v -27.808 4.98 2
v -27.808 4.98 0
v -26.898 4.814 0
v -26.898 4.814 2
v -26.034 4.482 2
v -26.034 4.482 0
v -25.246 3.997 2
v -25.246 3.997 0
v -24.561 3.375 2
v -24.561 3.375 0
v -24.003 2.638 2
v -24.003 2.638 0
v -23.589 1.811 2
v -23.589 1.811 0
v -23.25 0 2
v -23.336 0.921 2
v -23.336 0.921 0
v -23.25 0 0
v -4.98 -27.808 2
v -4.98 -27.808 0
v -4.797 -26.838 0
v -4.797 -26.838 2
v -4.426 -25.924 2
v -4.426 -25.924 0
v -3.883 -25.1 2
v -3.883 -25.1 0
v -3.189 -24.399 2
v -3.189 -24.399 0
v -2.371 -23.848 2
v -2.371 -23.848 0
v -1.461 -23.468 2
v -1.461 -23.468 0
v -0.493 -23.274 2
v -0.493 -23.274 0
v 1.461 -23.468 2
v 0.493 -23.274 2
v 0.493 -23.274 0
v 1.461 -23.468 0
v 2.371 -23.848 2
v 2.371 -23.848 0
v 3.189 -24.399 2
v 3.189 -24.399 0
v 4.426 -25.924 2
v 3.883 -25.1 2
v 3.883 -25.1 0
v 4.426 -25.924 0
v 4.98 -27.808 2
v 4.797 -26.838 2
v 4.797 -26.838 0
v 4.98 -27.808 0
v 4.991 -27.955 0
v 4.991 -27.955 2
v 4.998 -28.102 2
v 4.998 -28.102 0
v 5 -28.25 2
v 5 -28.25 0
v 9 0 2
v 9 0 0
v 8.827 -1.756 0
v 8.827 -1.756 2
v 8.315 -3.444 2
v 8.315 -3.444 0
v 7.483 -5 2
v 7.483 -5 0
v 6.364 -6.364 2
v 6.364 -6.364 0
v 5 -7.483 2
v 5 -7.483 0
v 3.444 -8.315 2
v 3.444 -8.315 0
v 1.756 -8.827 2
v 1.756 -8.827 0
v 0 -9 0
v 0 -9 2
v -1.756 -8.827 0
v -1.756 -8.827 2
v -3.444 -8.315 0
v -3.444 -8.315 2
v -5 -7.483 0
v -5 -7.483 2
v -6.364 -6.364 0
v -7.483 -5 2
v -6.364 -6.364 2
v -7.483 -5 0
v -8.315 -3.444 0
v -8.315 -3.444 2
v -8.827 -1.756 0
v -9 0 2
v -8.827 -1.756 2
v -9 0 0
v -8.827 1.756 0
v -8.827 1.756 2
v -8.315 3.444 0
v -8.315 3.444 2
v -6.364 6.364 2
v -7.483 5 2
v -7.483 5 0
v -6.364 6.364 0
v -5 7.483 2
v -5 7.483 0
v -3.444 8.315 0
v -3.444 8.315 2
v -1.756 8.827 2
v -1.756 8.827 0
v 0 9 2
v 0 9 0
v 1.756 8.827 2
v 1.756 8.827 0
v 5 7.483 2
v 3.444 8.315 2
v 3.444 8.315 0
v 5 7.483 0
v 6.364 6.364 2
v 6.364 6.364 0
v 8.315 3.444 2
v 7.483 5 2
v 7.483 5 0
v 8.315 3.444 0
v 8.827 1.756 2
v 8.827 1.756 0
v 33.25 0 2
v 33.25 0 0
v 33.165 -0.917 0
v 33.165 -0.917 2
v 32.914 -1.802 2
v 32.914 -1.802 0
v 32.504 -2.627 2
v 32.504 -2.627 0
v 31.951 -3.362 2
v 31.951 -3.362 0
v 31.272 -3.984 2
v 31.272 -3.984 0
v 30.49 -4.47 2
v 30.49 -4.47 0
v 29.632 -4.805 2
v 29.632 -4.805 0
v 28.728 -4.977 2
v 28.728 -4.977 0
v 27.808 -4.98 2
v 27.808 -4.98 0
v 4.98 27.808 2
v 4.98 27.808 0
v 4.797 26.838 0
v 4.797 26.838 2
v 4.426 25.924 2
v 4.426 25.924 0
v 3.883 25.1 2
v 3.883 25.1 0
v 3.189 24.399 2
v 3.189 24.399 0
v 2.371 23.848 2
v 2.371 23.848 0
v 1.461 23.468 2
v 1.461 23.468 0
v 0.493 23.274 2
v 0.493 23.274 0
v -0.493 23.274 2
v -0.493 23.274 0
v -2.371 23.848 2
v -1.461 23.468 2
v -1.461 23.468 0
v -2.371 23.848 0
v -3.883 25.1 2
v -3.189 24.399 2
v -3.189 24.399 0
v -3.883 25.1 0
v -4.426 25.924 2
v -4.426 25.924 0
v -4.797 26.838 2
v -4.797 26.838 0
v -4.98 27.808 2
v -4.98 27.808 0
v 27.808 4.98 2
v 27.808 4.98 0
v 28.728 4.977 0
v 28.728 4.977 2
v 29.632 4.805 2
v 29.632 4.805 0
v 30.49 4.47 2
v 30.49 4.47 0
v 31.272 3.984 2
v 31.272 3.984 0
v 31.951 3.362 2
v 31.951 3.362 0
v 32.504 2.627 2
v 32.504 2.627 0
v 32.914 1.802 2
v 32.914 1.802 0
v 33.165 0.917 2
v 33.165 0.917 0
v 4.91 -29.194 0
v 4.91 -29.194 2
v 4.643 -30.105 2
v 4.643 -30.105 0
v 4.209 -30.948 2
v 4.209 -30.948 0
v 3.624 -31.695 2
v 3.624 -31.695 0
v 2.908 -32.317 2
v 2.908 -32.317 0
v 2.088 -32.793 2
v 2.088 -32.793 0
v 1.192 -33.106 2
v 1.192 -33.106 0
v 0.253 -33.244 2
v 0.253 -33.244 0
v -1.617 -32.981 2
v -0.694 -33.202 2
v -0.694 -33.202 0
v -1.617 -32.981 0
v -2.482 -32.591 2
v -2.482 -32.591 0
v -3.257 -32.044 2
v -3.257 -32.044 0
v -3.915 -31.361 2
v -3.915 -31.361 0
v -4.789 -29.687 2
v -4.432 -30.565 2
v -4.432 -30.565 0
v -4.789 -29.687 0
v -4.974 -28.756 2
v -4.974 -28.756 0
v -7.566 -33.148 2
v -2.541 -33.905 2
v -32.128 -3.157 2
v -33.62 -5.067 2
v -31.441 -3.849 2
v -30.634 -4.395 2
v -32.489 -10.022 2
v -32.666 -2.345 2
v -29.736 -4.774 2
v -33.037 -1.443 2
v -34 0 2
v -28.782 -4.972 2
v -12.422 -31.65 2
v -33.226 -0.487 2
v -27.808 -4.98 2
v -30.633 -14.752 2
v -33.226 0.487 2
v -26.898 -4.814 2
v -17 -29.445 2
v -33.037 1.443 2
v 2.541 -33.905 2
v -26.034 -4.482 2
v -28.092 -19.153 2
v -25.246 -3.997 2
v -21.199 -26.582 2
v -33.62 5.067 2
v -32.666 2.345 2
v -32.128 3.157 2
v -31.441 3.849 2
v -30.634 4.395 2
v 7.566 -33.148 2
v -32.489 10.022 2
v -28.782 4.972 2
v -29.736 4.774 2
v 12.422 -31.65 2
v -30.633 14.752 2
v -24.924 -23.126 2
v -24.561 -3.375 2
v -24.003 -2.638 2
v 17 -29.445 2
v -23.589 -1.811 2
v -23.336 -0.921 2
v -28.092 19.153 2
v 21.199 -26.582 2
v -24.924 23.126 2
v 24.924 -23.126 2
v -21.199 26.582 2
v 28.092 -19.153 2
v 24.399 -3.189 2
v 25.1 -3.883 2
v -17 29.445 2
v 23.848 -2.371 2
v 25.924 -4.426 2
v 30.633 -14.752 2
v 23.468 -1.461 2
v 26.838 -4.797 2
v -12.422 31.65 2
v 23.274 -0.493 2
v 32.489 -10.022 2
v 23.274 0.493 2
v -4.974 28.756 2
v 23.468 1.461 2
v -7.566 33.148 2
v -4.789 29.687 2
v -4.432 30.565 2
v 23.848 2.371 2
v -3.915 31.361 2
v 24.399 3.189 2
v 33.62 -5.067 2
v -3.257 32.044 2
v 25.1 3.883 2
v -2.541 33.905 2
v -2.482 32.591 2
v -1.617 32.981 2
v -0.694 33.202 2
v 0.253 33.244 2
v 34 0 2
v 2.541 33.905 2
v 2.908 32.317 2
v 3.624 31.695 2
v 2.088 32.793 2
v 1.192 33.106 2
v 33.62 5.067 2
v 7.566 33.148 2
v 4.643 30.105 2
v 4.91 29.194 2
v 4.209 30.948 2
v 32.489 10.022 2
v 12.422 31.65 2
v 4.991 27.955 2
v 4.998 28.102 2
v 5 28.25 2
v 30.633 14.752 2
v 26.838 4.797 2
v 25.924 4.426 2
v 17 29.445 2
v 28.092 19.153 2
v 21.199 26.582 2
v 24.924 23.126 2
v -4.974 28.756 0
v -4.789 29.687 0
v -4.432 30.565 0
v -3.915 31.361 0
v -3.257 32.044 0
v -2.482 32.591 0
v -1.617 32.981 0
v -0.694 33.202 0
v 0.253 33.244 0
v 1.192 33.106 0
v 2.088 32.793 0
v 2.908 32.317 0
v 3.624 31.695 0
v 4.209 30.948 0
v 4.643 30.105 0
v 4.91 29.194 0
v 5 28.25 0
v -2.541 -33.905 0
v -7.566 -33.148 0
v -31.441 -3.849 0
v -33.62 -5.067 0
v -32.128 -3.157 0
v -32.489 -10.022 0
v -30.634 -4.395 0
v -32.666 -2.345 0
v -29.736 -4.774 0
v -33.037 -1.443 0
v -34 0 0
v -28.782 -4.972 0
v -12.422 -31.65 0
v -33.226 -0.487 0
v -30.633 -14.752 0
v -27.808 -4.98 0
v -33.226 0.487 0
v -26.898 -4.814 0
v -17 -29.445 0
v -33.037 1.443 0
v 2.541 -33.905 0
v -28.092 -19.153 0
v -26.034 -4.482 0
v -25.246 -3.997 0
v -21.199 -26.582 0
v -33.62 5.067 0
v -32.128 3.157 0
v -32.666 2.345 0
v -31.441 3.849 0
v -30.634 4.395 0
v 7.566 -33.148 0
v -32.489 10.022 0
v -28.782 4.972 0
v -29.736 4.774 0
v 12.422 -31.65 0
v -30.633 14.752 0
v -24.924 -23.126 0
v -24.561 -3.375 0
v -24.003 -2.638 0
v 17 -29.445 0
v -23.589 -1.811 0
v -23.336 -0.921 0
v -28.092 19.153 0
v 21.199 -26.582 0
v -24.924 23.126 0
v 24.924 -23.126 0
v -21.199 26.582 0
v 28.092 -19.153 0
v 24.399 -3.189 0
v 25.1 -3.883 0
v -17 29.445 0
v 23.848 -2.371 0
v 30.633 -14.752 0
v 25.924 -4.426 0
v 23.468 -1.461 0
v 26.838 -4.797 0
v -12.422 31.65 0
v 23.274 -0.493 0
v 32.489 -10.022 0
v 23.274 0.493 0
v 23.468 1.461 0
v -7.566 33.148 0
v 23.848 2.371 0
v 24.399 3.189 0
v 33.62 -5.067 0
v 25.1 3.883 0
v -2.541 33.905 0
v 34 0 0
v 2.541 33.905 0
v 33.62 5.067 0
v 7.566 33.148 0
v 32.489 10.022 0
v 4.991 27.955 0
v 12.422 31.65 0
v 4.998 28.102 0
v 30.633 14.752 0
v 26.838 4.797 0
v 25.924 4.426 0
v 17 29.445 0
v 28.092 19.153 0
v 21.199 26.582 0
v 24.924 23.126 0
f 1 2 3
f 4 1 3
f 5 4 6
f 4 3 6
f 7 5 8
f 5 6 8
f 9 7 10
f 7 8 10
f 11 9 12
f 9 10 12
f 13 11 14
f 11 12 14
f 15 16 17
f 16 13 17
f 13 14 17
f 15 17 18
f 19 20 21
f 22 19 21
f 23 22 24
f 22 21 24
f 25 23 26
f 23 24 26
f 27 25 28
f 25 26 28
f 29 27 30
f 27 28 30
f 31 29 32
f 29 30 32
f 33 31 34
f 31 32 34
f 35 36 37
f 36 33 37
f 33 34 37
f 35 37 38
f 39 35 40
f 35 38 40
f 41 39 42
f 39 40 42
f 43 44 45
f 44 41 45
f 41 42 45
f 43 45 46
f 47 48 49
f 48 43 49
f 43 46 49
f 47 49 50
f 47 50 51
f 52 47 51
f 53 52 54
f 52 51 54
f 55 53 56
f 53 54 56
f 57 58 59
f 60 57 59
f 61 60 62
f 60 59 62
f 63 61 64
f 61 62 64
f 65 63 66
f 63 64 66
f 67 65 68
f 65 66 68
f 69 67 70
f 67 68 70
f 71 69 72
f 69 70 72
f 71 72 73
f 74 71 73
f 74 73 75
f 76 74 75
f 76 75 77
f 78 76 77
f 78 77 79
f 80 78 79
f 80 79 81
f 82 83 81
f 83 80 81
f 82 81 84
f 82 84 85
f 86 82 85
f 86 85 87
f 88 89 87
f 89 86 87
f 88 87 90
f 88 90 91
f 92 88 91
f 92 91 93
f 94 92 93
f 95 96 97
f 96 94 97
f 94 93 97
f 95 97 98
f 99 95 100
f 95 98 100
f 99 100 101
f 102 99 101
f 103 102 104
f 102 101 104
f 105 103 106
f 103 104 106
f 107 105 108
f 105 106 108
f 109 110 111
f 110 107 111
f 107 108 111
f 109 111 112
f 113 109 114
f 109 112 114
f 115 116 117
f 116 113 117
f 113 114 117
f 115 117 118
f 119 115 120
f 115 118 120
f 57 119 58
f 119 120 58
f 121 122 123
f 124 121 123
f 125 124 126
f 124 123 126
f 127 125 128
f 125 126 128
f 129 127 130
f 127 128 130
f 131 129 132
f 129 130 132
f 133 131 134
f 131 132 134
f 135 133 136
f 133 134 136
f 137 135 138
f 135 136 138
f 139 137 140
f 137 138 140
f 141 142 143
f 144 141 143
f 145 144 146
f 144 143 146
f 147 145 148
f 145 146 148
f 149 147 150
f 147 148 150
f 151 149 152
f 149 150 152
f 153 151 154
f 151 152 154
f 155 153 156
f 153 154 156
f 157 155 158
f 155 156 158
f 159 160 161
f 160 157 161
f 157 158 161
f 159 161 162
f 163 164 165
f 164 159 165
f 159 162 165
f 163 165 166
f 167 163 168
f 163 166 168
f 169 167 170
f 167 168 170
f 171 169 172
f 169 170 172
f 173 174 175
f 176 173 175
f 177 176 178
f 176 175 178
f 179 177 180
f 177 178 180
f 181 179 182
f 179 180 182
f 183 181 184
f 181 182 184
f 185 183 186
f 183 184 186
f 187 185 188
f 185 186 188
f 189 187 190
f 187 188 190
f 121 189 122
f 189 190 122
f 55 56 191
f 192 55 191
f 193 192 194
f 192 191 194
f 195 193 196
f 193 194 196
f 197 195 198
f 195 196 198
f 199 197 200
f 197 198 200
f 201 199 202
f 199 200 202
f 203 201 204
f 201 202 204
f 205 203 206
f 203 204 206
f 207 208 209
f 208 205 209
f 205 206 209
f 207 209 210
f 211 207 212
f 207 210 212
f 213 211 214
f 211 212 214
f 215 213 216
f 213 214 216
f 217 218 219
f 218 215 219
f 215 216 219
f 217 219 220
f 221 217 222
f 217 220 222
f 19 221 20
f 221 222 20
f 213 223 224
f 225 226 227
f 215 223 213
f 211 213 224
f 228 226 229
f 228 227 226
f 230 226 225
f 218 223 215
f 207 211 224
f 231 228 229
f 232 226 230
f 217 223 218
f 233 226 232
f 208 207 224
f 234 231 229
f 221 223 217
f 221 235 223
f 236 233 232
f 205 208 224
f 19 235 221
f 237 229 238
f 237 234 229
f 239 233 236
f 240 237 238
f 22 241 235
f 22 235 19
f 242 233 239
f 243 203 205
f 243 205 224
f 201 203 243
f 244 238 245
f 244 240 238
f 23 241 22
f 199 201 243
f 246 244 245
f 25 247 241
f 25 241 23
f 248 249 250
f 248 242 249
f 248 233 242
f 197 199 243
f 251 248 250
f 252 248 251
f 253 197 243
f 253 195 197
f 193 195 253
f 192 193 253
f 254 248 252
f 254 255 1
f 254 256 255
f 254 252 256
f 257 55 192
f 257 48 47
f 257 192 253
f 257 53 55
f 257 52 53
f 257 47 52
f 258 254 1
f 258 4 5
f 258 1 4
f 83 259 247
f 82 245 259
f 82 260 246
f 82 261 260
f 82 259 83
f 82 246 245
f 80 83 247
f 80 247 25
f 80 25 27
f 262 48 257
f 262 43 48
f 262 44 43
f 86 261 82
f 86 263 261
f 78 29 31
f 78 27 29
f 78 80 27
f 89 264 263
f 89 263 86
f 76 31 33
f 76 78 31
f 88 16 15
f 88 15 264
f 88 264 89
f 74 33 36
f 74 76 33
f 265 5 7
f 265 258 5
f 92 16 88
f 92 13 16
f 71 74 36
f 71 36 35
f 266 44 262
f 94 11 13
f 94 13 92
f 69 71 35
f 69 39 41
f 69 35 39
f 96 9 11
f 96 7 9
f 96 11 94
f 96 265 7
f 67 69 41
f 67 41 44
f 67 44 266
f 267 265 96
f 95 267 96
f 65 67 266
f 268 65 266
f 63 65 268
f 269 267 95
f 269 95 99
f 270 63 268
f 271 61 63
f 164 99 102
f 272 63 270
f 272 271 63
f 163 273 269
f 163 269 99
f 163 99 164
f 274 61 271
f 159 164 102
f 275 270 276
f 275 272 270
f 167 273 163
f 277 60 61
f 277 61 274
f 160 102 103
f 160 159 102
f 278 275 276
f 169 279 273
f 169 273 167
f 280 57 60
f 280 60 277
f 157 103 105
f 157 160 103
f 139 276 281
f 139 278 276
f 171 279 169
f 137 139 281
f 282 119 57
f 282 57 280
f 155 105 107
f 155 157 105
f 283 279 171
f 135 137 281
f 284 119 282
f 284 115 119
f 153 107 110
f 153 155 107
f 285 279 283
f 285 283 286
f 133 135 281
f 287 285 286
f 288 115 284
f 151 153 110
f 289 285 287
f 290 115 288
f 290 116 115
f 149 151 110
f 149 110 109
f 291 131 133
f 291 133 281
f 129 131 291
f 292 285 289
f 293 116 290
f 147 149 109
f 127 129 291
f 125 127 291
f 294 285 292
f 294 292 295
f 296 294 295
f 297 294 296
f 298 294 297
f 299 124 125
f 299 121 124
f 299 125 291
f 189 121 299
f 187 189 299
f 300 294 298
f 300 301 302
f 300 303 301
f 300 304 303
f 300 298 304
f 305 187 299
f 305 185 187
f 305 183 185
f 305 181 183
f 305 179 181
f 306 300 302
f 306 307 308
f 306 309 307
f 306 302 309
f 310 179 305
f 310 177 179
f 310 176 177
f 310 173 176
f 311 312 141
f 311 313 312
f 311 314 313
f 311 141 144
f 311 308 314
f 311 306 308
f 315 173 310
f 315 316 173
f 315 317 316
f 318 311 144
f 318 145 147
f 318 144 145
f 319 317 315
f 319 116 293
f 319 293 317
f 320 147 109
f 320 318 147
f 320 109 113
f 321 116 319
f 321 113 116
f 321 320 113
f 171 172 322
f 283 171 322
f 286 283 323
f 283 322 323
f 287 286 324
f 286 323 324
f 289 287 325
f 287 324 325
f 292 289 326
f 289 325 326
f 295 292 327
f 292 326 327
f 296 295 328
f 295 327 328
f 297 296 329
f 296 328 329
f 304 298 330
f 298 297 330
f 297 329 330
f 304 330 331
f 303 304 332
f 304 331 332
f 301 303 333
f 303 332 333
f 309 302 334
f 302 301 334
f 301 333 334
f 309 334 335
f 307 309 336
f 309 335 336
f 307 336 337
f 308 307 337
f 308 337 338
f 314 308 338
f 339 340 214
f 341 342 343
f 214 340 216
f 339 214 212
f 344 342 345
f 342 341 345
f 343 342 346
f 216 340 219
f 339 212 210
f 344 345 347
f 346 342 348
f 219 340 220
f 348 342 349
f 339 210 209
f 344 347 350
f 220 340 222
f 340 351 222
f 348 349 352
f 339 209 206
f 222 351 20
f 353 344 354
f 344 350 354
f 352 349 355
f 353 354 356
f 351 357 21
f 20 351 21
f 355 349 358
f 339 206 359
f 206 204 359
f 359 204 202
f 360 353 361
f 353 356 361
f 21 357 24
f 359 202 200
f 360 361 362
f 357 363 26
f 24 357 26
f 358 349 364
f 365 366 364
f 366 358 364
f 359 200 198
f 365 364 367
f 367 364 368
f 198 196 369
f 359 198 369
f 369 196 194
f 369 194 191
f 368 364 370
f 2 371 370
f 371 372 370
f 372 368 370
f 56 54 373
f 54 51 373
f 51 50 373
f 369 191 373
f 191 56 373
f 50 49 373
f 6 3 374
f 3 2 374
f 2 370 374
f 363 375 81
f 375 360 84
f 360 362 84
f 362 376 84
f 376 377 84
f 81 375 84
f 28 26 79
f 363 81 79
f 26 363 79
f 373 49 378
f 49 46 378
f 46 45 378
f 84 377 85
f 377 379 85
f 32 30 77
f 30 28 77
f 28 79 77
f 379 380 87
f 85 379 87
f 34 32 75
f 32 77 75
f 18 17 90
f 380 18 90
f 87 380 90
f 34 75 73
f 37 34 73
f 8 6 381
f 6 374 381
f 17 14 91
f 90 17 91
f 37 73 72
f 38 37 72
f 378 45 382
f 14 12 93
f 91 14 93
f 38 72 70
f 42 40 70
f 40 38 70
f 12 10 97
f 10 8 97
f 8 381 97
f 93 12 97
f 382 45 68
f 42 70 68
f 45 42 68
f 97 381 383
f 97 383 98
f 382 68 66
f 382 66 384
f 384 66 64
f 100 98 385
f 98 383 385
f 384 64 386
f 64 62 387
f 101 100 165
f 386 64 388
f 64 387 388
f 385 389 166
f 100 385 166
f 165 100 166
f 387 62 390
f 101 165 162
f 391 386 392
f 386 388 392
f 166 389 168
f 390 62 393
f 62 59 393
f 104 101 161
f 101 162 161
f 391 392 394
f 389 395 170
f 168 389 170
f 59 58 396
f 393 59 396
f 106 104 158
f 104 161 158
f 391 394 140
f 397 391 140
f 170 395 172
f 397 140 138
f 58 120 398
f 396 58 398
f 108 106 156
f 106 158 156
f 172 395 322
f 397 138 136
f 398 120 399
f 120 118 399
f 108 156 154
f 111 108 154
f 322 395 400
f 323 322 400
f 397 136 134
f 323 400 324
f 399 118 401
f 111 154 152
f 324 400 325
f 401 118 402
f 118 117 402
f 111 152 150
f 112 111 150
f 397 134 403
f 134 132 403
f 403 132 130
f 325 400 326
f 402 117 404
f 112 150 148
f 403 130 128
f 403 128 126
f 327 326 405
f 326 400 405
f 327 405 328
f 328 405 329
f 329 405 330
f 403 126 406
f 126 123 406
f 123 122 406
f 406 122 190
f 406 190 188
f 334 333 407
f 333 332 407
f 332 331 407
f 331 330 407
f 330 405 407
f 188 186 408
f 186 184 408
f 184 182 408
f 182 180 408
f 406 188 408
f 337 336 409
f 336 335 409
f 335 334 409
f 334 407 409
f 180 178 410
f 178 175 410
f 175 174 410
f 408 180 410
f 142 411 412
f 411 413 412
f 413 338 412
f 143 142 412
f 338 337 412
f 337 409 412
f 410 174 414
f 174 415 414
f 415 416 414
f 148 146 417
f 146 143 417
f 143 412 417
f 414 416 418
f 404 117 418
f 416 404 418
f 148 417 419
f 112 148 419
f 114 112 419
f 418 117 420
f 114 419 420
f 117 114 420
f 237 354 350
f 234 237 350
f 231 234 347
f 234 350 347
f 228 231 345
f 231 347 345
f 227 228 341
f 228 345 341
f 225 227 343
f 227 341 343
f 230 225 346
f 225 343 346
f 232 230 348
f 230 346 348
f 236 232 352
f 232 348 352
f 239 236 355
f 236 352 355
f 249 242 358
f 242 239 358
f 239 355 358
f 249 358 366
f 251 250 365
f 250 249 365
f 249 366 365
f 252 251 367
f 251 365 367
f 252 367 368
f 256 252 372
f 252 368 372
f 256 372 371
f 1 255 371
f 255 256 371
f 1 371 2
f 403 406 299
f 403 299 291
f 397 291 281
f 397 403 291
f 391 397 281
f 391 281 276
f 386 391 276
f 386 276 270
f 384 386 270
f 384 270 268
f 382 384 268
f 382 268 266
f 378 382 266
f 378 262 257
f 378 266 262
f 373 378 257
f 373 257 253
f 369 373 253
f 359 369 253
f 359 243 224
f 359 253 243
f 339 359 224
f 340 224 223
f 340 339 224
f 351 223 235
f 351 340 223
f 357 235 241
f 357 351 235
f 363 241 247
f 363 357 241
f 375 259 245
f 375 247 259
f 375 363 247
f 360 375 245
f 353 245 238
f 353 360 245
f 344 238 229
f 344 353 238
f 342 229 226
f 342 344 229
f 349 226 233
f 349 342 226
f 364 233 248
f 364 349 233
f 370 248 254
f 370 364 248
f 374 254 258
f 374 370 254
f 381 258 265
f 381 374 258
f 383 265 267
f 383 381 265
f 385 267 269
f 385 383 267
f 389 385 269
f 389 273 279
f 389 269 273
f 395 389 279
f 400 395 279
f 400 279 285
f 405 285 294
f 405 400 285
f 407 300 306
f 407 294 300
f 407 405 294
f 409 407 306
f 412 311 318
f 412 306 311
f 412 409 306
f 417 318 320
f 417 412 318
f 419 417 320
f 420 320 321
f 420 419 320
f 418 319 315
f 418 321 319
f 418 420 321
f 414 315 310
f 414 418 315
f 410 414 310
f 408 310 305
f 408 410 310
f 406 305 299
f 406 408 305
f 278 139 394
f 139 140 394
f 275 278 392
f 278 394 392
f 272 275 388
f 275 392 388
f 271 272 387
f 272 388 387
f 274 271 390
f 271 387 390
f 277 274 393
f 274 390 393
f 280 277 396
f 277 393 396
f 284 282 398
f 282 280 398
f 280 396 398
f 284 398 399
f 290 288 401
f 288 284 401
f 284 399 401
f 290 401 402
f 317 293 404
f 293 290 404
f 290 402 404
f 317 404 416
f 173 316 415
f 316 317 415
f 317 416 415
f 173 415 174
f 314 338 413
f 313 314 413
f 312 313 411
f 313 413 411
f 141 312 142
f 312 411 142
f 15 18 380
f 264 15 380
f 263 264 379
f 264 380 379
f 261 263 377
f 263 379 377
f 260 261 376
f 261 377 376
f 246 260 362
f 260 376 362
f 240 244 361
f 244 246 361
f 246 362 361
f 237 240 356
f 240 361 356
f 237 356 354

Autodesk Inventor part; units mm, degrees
ref_plane "YZ Plane" through (0, 0, 0) normal (1, 0, 0) x (0, 1, 0)
ref_plane "XZ Plane" through (0, 0, 0) normal (0, 1, 0) x (-1, 0, 0)
ref_plane "XY Plane" through (0, 0, 0) normal (0, 0, 1) x (1, 0, 0)
sketch "Sketch1" plane through (0, 0, 0) normal (0, 0, 1) x (1, 0, 0)
  circle A0 centre (0, 0) radius 34
  circle A1 centre (0, 0) radius 9
  circle A2 centre (0, 28.25) radius 5
  circle A3 centre (-28.25, 0) radius 5
  circle A4 centre (0, -28.25) radius 5
  circle A5 centre (28.25, 0) radius 5
  arc A6 (4.9804, 27.8075) -> (-4.9804, 27.8075) centre (0, 0) ccw
  arc A7 (27.8075, -4.9804) -> (27.8075, 4.9804) centre (0, 0) ccw
  arc A8 (-27.8075, 4.9804) -> (-27.8075, -4.9804) centre (0, 0) ccw
  arc A9 (-4.9804, -27.8075) -> (4.9804, -27.8075) centre (0, 0) ccw
  dimension "d0" = 68
  dimension "d1" = 18
  dimension "d3" = 10
  dimension "d6" = 360
extrude "Extrusion1" add sketch "Sketch1" along normal blind 2
properties part number "Black Rubber Pad Bottom"
